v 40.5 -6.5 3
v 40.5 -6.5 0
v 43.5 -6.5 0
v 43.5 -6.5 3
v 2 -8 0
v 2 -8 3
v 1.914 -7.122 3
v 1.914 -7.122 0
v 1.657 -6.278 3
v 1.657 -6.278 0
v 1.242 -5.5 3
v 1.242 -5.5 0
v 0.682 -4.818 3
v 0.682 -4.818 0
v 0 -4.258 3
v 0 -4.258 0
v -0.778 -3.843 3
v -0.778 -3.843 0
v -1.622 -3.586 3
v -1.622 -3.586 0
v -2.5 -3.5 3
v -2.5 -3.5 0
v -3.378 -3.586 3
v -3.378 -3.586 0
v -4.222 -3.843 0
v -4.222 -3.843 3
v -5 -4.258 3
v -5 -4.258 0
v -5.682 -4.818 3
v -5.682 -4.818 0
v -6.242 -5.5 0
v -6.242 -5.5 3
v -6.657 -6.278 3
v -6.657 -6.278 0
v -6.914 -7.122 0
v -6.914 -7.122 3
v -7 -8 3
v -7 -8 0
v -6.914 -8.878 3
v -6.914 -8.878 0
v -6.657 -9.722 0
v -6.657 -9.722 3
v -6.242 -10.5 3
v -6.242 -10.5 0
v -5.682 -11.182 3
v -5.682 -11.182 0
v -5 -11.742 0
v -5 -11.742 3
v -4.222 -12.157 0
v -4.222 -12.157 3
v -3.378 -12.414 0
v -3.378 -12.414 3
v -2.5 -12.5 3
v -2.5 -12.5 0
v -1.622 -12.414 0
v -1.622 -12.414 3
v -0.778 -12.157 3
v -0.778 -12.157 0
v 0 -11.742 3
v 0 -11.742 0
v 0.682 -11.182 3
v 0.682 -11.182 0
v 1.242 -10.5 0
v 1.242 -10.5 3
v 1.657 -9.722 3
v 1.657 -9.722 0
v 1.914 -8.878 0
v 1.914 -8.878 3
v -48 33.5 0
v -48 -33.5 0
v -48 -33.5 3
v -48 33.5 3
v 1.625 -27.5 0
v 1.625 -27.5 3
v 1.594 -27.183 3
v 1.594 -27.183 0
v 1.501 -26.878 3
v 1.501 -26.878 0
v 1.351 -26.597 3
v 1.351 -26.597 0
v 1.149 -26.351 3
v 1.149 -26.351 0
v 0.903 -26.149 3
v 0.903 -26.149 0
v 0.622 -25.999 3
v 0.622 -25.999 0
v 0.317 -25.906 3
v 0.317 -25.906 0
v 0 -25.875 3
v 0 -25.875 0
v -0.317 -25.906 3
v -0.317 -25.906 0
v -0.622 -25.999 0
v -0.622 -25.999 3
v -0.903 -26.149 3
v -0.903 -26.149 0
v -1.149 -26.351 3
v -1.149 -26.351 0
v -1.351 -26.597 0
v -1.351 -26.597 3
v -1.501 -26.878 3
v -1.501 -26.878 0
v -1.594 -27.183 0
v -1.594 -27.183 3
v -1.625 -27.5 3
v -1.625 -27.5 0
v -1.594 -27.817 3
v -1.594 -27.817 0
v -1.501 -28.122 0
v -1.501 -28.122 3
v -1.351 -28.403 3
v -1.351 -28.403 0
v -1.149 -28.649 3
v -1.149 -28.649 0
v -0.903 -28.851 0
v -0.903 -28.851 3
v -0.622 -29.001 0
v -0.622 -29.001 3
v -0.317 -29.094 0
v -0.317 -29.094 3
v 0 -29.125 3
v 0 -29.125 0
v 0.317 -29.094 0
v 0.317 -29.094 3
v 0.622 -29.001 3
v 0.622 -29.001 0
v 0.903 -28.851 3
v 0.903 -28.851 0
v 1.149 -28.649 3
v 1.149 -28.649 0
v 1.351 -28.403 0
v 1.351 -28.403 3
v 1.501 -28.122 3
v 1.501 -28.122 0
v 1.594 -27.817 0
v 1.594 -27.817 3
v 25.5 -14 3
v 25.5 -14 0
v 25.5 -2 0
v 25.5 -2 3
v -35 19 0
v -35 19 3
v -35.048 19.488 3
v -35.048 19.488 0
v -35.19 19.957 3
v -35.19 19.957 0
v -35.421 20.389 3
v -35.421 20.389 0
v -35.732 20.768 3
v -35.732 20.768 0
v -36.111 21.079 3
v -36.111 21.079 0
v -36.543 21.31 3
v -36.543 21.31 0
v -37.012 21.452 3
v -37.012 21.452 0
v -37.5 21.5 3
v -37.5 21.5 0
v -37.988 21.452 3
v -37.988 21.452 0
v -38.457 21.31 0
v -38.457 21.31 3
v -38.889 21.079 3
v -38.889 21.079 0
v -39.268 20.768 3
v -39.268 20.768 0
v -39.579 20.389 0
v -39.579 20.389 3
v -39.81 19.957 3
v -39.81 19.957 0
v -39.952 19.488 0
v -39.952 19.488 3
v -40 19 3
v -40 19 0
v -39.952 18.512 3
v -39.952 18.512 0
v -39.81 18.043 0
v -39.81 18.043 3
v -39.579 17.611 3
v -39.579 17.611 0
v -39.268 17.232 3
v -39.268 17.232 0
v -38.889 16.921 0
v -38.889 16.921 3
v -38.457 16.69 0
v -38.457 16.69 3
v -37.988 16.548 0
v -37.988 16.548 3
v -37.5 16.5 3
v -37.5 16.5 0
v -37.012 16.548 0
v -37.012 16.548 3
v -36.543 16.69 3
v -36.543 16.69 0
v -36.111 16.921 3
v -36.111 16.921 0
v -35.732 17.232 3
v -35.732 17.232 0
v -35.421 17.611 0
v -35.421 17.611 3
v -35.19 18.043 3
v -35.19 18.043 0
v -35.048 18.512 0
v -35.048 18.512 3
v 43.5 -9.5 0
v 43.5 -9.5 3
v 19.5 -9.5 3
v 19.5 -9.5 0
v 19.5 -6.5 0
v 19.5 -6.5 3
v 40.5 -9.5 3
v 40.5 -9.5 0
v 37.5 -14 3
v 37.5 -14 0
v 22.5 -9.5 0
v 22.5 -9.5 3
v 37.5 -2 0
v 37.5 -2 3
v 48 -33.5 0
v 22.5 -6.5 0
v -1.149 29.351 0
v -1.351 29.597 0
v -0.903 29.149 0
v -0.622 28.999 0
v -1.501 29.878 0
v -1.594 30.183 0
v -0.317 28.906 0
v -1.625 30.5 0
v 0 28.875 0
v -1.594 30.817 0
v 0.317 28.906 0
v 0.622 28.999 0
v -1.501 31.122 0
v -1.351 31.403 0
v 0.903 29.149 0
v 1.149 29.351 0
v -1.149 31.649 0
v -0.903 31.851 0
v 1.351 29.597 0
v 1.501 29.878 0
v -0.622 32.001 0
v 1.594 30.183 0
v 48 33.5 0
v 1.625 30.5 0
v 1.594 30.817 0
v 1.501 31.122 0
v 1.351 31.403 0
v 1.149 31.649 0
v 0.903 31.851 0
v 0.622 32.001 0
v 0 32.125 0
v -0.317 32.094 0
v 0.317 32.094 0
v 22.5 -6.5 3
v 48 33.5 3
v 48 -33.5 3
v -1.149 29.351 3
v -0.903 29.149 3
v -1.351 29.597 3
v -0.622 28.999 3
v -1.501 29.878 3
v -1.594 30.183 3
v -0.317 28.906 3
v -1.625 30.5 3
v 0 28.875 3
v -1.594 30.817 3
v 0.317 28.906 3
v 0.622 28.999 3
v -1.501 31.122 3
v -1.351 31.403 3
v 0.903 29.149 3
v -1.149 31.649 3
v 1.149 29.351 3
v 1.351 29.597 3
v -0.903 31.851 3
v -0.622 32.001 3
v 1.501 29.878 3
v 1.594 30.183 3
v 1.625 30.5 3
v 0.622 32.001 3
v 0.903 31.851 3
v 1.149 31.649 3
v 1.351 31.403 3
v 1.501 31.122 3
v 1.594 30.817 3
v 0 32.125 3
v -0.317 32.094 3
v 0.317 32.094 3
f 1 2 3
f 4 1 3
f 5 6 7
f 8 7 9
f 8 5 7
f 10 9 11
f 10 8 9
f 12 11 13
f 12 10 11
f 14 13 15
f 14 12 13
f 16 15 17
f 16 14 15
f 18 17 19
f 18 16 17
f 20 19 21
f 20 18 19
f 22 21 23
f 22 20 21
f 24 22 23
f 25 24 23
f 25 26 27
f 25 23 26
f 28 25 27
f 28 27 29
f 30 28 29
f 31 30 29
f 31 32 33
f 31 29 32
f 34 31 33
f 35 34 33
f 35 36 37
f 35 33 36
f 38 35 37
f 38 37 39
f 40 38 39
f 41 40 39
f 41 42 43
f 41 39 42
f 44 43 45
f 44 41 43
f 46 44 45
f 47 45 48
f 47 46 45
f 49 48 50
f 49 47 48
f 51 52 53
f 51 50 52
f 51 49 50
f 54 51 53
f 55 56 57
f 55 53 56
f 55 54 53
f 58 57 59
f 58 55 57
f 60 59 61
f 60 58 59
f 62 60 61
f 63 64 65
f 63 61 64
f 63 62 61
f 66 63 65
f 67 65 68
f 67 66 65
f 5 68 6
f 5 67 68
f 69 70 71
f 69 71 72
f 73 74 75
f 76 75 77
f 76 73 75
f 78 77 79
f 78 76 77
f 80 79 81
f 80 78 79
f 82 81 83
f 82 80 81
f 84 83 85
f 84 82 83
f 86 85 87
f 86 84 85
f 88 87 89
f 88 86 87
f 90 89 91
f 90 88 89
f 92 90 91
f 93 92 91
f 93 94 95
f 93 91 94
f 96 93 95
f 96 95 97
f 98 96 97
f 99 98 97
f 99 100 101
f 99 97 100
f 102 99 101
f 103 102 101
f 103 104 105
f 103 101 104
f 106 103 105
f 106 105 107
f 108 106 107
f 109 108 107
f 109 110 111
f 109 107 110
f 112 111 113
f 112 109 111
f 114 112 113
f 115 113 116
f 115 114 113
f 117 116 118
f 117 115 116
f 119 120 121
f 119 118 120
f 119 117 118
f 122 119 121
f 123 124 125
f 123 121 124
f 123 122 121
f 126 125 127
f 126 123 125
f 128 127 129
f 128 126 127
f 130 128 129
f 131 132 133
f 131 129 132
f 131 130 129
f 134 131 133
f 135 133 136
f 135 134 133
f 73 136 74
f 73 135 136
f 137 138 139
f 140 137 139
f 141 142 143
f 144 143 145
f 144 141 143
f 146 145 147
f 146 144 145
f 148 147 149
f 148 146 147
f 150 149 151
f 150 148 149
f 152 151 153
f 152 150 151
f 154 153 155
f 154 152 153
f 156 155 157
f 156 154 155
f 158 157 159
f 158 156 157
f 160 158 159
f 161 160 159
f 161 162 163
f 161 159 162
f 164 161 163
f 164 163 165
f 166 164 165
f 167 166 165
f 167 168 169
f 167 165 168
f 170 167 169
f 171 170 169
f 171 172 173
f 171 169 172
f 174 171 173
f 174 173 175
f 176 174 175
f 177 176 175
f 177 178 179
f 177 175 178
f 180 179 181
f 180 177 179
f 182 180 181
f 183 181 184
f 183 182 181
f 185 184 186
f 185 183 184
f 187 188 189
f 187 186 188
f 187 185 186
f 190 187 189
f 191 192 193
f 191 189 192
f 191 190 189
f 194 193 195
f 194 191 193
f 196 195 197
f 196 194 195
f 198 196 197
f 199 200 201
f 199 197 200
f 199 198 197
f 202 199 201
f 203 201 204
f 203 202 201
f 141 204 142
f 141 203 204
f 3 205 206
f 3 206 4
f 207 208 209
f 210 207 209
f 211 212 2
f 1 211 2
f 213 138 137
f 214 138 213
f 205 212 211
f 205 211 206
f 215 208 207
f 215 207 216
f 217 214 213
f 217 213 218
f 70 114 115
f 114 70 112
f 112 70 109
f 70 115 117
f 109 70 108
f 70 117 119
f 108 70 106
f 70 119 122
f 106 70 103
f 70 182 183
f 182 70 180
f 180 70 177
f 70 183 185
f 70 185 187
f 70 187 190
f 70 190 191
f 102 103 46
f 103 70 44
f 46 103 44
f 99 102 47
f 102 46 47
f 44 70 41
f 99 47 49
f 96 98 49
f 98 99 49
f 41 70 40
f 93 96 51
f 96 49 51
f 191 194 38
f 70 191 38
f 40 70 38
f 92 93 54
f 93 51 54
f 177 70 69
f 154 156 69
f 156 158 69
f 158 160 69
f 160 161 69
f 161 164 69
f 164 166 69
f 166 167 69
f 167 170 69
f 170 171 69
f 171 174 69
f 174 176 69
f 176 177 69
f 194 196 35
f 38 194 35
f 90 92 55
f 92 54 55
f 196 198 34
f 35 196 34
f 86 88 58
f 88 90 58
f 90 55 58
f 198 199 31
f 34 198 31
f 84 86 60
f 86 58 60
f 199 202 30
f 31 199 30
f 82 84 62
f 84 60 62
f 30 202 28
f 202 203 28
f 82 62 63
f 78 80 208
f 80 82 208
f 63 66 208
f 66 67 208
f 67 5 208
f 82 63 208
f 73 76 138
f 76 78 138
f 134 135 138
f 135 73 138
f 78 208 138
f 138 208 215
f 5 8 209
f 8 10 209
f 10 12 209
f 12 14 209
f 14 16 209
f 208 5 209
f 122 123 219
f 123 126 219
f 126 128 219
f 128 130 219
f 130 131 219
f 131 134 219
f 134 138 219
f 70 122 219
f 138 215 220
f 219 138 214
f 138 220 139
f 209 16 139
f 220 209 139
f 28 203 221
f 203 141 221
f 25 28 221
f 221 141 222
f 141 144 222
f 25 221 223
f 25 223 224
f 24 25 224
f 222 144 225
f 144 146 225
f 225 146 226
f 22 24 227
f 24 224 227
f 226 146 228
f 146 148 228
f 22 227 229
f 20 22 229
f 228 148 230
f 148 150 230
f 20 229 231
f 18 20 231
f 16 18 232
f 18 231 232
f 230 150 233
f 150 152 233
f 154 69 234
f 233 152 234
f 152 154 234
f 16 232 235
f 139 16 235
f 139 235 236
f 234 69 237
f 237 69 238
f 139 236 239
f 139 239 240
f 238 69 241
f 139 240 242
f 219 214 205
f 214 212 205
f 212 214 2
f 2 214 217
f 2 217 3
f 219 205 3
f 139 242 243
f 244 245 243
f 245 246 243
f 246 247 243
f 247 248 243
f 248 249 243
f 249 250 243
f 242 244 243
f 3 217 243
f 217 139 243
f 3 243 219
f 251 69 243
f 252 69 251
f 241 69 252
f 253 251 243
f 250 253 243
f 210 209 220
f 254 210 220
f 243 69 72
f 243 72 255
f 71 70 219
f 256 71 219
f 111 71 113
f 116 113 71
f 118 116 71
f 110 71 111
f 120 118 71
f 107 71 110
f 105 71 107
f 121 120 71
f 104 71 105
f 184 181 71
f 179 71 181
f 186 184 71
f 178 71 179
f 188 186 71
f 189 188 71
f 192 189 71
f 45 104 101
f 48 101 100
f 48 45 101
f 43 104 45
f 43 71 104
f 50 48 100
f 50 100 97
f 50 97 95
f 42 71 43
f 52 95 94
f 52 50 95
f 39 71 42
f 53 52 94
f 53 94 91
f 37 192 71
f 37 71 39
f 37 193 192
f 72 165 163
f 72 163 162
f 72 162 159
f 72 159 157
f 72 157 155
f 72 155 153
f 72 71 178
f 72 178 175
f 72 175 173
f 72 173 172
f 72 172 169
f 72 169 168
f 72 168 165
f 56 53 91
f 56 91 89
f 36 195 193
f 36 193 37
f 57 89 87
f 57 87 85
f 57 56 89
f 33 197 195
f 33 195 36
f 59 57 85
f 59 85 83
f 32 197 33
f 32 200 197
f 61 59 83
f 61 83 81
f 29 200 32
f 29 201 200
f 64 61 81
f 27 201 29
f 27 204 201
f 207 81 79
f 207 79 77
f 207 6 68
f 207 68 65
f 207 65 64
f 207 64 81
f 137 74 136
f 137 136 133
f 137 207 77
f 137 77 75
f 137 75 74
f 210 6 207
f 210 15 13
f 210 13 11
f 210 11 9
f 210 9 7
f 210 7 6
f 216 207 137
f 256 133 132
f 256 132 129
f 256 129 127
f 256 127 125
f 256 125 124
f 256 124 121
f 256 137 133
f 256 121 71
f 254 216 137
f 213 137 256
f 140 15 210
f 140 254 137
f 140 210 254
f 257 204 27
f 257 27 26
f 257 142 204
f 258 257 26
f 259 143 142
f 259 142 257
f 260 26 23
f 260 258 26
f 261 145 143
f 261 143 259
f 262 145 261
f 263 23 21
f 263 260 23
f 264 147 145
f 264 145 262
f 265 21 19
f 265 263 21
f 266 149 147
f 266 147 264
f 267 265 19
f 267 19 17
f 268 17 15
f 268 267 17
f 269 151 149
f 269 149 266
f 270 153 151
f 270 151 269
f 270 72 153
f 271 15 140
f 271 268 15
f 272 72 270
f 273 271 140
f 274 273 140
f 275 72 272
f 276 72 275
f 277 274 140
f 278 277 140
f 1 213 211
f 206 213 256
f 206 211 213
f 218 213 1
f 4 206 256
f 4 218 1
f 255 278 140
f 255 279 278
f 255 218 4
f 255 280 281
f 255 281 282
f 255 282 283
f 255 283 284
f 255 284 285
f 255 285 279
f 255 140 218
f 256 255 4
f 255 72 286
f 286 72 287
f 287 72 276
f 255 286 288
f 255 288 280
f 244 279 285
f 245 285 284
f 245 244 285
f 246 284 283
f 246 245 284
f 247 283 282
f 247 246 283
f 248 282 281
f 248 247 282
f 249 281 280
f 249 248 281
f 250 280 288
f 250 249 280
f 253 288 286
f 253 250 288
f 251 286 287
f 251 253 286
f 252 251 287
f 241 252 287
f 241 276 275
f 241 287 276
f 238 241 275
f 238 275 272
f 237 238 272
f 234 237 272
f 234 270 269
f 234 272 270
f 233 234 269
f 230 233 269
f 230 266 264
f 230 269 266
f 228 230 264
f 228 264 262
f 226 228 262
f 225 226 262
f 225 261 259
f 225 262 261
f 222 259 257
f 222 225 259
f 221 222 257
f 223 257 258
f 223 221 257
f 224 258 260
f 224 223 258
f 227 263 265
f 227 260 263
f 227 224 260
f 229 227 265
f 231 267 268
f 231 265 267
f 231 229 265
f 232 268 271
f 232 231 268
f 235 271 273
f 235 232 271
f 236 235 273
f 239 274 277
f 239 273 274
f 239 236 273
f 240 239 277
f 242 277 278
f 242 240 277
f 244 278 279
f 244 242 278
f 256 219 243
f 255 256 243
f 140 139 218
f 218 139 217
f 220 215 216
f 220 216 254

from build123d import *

# Parameters (mm, degrees)
CROQUIS1_W              = 96
CROQUIS1_H              = 67
SALIENTE_EXTRUIR1_DEPTH = 3
CROQUIS2_R              = 2.5
CROQUIS2_R_2            = 4.5
CROQUIS2_R_3            = 1.625
CROQUIS2_W              = 12
CROQUIS2_H              = 12
CROQUIS2_W_2            = 3
CROQUIS2_H_2            = 3
CORTAR_EXTRUIR1_DEPTH   = 59.611005792


with BuildPart() as part:
    # Croquis1 → Saliente-Extruir1 (new body)
    with BuildSketch(Plane.XY):
        Rectangle(CROQUIS1_W, CROQUIS1_H)
    extrude(amount=SALIENTE_EXTRUIR1_DEPTH)

    # Croquis2 → Cortar-Extruir1 (cut, through all)
    with BuildSketch(Plane.XY):
        with Locations((-37.5, 19)):
            Circle(CROQUIS2_R)
        with Locations((-2.5, -8)):
            Circle(CROQUIS2_R_2)
        with Locations((0, 30.5)):
            Circle(CROQUIS2_R_3)
        with Locations((0, -27.5)):
            Circle(CROQUIS2_R_3)
        with Locations((31.5, -8)):
            Rectangle(CROQUIS2_W, CROQUIS2_H)
        with Locations((21, -8)):
            Rectangle(CROQUIS2_W_2, CROQUIS2_H_2)
        with Locations((42, -8)):
            Rectangle(CROQUIS2_W_2, CROQUIS2_H_2)
    extrude(amount=CORTAR_EXTRUIR1_DEPTH, mode=Mode.SUBTRACT)


solid = part.part
